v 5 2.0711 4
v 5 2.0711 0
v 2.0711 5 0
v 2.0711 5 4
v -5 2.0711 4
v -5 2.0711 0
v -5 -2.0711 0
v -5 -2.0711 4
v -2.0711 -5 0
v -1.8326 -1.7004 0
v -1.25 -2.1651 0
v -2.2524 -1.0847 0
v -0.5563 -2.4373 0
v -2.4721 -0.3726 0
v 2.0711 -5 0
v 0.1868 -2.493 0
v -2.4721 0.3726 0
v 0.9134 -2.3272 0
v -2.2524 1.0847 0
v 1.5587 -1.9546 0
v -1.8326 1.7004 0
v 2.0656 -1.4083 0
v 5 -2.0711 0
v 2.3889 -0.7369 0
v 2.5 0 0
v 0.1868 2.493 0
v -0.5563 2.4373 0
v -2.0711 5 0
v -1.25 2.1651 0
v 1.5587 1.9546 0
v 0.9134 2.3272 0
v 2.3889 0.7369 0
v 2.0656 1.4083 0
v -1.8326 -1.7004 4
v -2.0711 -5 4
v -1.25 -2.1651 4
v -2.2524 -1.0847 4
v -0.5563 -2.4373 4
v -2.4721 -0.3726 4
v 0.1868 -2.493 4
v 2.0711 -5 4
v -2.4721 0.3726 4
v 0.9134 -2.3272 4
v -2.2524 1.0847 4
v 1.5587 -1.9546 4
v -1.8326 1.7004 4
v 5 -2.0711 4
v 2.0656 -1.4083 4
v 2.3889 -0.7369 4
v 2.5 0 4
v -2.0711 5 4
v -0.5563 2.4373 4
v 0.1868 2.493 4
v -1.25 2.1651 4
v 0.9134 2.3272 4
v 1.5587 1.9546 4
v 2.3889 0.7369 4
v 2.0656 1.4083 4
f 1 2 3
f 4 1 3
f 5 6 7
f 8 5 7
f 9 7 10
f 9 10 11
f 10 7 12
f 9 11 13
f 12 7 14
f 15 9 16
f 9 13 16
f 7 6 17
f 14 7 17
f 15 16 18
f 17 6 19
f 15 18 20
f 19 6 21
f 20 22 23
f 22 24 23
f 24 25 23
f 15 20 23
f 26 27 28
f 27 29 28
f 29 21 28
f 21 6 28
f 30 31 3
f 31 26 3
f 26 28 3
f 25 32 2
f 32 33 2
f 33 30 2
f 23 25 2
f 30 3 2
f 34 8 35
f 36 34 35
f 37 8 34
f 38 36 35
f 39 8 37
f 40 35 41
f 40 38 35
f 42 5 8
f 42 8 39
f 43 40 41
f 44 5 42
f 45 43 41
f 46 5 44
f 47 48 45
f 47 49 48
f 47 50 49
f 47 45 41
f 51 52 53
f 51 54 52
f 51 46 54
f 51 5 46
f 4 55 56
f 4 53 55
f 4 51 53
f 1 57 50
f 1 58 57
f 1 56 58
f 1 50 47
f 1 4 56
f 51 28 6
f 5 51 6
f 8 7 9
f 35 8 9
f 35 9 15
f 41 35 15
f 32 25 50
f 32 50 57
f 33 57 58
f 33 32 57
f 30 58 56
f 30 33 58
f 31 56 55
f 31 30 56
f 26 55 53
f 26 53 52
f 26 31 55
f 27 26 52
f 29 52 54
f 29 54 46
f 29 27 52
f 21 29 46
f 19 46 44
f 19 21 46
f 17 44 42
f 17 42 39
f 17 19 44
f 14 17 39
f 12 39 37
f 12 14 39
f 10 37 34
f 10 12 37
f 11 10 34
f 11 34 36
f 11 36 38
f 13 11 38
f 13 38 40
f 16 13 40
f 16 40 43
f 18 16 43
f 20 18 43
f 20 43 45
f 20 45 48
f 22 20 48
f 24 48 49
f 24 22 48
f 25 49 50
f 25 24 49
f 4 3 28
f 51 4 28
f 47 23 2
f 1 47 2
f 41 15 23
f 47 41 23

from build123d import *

# Parameters (mm, degrees)
ESQUISSE1_R        = 2.5
BOSS_EXTRU_1_DEPTH = 4


with BuildPart() as part:
    # Esquisse1 → Boss.-Extru.1 (new body)
    with BuildSketch(Plane.XY):
        Polygon((-5, -2.071067812), (-3.535533906, -3.535533906), (-2.071067812, -5), (2.071067812, -5), (3.535533906, -3.535533906), (5, -2.071067812), (5, 2.071067812), (3.535533906, 3.535533906), (2.071067812, 5), (-2.071067812, 5), (-3.535533906, 3.535533906), (-5, 2.071067812), (-5, 0), align=None)
        Circle(ESQUISSE1_R, mode=Mode.SUBTRACT)
    extrude(amount=BOSS_EXTRU_1_DEPTH)


solid = part.part
